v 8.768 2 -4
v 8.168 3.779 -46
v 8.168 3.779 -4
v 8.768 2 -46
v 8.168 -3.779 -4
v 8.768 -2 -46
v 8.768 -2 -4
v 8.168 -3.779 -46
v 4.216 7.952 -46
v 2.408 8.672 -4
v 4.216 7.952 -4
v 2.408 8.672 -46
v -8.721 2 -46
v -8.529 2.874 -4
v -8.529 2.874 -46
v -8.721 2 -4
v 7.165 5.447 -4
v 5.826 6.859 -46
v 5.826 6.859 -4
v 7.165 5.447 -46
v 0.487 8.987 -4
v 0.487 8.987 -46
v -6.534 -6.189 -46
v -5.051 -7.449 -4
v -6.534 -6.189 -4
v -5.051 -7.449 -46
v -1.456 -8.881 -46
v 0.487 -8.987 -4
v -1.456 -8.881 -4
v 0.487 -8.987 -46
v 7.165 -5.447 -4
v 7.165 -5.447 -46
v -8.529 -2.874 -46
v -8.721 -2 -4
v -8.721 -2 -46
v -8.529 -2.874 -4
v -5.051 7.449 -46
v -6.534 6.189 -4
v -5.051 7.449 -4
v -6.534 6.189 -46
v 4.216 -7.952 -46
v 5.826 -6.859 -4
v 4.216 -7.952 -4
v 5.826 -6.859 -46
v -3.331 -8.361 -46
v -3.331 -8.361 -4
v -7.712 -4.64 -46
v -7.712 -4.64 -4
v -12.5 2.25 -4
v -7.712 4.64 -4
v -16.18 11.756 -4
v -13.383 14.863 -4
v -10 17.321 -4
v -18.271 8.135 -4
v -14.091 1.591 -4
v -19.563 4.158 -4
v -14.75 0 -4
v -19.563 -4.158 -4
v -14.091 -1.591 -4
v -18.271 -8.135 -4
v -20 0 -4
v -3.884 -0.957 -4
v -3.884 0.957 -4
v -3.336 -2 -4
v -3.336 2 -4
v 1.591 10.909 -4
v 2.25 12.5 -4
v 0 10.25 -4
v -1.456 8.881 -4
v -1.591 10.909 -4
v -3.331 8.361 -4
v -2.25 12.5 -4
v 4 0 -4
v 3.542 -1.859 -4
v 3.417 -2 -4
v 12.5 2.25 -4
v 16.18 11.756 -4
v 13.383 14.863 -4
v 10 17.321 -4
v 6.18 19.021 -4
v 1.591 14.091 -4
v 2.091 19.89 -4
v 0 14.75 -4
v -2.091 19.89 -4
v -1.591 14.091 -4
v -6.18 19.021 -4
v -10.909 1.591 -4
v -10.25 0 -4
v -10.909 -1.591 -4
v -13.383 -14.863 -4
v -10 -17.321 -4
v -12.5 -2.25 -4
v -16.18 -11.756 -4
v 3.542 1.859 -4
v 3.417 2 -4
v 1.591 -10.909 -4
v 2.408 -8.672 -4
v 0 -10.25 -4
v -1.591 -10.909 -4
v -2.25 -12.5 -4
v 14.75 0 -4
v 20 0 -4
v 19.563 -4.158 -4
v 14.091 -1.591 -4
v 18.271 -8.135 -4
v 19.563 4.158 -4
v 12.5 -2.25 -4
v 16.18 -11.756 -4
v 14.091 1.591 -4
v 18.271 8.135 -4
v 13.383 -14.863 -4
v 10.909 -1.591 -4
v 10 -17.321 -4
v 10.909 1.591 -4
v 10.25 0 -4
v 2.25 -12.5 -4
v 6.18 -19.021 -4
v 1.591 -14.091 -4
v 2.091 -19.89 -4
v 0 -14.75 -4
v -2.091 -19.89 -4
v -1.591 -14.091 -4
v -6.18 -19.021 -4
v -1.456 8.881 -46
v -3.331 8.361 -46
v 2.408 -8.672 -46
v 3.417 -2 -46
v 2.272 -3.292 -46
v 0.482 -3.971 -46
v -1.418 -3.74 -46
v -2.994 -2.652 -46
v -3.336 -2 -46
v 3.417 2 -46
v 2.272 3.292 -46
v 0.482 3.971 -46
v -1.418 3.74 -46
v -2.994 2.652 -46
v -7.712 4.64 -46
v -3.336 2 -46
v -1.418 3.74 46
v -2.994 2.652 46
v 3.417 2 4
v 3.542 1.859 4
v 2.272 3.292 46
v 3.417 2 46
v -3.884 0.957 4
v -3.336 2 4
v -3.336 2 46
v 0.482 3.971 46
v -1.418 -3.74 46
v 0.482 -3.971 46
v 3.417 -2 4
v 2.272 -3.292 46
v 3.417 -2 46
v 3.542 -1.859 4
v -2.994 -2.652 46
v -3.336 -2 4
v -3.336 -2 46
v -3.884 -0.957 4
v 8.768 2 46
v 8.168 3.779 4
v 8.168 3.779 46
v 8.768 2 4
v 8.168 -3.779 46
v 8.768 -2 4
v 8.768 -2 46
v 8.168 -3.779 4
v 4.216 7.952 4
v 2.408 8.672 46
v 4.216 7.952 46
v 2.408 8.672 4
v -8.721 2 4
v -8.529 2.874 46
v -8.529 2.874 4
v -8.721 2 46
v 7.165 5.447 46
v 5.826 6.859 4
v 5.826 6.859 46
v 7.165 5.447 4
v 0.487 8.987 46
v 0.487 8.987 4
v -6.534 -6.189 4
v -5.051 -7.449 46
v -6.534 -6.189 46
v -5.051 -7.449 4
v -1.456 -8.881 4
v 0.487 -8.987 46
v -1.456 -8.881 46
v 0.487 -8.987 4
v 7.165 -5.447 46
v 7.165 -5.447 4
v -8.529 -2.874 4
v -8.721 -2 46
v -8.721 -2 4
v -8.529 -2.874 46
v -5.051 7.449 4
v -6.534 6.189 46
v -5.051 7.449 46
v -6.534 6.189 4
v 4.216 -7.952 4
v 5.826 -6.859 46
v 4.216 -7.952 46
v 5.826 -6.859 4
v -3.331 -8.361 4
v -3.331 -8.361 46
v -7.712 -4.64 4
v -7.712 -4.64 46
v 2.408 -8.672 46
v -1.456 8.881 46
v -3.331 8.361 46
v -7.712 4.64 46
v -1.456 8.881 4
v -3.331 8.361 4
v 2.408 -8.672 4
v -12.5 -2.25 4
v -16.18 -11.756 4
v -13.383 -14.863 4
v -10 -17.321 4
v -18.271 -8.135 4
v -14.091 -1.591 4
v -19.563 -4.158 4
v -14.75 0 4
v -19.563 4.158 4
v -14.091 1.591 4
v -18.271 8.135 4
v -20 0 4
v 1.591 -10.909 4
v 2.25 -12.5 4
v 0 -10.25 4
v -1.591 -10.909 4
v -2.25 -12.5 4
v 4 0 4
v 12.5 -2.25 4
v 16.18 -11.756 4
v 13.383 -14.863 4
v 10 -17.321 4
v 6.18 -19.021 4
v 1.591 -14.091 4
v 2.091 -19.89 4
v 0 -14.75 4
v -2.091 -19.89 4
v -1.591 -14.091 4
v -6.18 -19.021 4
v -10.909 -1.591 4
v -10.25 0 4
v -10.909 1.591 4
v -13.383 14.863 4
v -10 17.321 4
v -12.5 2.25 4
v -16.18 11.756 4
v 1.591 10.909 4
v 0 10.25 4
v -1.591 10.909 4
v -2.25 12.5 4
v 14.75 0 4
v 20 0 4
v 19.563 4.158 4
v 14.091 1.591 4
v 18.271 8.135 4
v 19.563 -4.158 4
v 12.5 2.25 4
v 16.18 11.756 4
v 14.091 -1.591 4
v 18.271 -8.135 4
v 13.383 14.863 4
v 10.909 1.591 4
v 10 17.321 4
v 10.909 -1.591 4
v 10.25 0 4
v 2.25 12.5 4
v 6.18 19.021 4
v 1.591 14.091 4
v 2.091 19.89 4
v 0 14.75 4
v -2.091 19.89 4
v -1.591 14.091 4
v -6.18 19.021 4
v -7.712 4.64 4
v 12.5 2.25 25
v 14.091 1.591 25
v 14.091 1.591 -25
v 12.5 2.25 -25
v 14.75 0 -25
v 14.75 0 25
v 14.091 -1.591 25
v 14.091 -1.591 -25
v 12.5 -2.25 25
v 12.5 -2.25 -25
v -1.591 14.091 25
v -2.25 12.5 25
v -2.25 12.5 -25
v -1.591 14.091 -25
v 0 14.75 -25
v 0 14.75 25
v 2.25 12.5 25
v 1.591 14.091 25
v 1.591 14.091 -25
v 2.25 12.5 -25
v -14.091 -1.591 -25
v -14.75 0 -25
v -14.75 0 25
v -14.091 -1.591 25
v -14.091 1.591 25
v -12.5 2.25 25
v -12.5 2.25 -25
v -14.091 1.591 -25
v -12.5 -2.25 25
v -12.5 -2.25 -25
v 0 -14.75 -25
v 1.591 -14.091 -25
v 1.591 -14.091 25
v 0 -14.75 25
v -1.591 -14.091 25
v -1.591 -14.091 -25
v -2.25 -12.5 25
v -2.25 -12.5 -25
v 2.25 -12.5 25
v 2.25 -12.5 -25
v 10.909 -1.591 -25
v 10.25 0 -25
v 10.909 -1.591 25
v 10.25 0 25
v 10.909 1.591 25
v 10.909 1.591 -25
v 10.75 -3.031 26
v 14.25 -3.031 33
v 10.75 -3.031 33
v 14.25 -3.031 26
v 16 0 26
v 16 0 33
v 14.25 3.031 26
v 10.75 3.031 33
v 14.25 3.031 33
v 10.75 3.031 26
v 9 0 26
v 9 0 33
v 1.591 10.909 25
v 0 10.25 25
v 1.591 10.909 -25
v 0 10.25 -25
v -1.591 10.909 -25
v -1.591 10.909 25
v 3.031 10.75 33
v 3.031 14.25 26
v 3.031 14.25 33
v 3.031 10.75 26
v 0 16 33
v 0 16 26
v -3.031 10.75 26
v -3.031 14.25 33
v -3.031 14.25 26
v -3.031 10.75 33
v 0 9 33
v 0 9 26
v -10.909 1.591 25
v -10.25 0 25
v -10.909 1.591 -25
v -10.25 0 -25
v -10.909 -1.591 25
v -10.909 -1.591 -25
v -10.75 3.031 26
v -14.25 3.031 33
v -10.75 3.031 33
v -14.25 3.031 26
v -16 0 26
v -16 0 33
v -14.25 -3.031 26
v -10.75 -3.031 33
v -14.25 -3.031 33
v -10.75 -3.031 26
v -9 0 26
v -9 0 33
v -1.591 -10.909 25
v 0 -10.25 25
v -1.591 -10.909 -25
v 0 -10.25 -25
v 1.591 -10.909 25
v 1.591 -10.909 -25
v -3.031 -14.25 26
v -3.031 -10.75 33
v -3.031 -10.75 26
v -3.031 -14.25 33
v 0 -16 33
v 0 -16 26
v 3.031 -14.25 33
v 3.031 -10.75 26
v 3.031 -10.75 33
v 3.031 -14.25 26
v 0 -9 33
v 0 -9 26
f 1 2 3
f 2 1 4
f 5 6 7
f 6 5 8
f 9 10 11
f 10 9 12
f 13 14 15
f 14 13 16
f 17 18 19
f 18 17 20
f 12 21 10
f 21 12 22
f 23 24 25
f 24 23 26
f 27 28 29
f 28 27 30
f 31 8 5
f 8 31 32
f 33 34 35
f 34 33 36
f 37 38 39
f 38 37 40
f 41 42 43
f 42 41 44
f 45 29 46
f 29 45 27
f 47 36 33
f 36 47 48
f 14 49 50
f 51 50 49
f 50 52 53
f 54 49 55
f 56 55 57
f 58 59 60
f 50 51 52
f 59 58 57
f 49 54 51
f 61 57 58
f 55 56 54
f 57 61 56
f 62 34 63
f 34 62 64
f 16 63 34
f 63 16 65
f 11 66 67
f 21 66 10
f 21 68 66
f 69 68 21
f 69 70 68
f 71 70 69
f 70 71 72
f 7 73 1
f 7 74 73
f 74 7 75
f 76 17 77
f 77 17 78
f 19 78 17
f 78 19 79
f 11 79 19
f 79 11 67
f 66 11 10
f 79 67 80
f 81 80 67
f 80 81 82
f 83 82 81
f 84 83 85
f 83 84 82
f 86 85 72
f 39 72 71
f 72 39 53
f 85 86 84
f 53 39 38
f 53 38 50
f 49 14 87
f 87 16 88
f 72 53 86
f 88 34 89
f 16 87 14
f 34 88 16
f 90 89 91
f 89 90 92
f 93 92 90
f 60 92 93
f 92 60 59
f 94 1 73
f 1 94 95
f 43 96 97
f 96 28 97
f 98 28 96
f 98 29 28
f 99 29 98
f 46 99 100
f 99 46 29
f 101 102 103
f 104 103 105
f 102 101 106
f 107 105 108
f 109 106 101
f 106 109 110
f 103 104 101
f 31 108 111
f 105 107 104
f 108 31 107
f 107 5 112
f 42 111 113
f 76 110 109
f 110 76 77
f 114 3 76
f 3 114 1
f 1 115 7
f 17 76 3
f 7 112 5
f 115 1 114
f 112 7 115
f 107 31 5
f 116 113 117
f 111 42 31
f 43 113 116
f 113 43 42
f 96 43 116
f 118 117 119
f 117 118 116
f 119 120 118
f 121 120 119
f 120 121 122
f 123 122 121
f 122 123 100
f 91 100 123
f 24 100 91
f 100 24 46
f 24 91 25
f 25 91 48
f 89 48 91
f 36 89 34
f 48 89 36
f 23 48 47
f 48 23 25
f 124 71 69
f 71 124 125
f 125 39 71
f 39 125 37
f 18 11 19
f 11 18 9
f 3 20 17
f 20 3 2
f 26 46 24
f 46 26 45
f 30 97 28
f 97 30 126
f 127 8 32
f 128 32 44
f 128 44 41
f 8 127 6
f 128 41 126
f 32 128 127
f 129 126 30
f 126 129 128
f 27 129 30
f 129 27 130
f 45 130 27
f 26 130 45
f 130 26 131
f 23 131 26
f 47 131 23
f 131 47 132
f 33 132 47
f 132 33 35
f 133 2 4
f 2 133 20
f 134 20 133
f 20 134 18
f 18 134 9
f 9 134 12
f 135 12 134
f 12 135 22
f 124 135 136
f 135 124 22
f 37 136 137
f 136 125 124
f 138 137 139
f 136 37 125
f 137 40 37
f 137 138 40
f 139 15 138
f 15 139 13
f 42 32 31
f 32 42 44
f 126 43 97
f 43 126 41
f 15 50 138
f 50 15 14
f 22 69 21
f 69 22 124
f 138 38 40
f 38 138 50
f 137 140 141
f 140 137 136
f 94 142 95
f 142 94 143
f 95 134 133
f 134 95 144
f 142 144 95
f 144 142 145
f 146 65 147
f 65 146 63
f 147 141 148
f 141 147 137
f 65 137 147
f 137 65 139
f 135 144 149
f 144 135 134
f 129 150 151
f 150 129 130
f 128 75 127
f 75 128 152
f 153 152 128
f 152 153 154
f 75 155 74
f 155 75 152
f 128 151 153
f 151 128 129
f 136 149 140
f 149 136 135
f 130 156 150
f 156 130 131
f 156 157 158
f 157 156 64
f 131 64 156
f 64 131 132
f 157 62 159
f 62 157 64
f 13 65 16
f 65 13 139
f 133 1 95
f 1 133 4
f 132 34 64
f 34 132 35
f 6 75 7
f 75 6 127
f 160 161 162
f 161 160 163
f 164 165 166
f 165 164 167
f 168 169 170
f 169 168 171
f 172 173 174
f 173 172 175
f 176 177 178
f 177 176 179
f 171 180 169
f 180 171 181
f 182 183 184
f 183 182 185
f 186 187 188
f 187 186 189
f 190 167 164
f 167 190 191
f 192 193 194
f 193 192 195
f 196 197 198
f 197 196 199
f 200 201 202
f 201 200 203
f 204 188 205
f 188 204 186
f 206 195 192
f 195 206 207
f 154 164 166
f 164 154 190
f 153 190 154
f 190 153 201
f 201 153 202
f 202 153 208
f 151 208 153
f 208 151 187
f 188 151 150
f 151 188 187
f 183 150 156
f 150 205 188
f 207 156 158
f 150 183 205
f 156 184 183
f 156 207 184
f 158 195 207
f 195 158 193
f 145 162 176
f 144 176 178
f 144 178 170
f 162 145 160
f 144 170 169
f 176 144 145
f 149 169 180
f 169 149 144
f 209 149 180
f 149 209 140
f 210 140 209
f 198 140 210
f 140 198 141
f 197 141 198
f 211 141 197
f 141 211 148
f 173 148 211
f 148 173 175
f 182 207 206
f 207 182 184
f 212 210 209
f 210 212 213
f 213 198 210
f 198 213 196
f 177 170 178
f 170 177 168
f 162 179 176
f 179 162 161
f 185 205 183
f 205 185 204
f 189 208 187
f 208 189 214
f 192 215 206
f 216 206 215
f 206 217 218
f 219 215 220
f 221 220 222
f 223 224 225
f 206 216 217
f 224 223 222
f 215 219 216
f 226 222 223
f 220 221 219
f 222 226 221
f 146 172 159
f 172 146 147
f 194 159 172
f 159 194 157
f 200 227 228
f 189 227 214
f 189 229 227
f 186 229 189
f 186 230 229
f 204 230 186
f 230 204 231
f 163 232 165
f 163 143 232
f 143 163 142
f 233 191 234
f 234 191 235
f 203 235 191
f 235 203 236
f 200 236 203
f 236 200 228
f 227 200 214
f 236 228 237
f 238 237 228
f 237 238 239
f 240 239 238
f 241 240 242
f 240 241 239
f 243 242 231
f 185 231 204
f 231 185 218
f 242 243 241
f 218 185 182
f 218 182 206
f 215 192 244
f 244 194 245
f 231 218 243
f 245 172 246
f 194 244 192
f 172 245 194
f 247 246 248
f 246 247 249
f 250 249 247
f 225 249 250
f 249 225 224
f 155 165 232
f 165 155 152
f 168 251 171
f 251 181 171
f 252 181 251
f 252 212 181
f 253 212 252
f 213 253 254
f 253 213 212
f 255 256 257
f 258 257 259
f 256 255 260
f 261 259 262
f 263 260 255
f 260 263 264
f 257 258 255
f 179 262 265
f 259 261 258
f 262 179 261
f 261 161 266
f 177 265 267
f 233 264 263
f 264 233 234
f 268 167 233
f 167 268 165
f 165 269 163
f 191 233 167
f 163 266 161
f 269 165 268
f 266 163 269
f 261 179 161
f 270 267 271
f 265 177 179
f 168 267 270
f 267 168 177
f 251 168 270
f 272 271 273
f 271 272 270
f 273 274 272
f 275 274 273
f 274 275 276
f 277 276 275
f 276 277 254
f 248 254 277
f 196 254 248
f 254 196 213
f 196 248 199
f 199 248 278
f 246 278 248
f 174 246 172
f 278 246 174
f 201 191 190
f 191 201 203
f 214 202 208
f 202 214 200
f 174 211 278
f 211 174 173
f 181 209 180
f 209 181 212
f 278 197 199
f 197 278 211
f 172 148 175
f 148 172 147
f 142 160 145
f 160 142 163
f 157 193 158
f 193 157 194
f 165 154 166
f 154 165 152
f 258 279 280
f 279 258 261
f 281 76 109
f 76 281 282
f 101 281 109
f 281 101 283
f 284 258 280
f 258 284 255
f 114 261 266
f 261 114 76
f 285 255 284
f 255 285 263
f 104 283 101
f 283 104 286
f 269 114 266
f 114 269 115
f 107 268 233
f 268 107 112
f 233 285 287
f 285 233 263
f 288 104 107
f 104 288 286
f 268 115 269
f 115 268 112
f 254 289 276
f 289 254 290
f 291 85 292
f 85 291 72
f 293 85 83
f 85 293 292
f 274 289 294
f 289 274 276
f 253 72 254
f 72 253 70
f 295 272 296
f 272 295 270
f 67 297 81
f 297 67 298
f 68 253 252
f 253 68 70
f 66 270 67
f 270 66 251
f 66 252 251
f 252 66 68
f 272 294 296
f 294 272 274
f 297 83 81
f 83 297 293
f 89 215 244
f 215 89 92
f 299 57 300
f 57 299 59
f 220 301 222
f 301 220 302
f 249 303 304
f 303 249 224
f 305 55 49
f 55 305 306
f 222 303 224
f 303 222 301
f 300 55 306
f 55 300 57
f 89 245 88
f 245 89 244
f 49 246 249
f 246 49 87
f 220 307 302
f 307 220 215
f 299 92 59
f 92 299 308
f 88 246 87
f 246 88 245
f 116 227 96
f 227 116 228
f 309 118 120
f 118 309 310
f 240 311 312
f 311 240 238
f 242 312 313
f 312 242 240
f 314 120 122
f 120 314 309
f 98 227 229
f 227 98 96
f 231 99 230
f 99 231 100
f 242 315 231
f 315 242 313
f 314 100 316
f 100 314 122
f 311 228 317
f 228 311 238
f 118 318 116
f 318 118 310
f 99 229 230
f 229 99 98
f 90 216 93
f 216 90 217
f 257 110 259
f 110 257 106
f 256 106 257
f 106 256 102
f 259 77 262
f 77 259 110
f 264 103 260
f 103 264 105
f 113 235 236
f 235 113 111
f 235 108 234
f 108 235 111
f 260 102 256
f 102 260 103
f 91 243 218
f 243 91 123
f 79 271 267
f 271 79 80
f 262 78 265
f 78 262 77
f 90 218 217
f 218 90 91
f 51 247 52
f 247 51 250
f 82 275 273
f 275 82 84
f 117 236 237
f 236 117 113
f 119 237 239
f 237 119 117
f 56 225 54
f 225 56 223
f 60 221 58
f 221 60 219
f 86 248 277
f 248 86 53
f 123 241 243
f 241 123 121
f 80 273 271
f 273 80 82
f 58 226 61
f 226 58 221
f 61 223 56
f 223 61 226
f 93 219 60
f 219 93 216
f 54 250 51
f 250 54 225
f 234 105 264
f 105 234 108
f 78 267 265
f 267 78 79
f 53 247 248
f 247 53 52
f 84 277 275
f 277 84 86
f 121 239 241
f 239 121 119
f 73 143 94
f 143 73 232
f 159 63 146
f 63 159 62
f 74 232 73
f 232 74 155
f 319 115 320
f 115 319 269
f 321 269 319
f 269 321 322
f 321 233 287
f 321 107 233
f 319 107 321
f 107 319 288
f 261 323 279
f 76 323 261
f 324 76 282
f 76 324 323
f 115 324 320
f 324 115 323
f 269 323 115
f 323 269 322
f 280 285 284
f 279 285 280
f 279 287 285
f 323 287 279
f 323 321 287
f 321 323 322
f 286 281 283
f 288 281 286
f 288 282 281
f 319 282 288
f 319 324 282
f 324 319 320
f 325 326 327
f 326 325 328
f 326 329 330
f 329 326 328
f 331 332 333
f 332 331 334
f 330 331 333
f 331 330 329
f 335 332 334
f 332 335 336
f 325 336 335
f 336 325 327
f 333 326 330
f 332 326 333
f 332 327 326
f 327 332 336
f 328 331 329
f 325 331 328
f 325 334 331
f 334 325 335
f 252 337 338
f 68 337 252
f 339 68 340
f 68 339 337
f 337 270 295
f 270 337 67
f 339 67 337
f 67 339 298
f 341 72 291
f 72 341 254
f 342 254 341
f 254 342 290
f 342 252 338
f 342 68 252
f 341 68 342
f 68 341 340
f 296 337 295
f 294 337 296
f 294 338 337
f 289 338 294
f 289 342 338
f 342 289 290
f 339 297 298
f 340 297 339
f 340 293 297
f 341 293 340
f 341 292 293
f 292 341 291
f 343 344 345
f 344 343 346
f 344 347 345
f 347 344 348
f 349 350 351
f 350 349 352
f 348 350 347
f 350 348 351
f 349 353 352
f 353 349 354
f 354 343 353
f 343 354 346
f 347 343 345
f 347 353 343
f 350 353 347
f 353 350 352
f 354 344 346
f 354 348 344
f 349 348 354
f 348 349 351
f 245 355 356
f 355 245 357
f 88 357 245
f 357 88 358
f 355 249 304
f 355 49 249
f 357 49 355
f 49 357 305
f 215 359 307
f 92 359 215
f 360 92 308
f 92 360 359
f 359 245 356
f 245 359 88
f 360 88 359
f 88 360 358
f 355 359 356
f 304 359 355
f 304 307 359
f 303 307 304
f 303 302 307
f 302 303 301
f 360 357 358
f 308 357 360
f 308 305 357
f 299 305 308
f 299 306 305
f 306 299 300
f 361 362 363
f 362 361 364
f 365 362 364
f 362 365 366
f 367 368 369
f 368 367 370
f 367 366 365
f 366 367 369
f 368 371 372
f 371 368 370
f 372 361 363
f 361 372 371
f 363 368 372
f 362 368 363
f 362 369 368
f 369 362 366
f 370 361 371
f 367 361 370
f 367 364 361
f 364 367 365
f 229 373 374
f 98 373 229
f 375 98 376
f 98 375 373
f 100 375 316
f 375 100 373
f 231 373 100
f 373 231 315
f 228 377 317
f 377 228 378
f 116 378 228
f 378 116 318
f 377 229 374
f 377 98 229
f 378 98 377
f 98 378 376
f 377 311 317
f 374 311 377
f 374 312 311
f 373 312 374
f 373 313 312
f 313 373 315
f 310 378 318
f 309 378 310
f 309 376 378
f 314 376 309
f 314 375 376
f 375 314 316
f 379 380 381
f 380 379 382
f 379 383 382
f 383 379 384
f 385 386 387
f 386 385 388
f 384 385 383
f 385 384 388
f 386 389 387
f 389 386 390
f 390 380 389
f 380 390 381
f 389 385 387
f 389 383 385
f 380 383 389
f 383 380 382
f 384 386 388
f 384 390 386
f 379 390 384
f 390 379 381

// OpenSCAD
//start

// Parameters
shaft_length = 42; // Adjusted length for better alignment
shaft_diameter = 18; // Adjusted diameter for better match
shaft_hole_diameter = 8;
flange_diameter = 40;
flange_thickness = 4; // Reduced thickness to match original
diaphragm_thickness = 2;
bolt_diameter = 4.5; // Reduced diameter for better match
bolt_length = 50;
nut_size = 7; // Reduced size for better match
bolt_spacing = 25;

// Function to create a shaft with keyway slots
module shaft() {
    difference() {
        cylinder(h=shaft_length, d=shaft_diameter, center=true);
        cylinder(h=shaft_length+2, d=shaft_hole_diameter, center=true);
        
        // Adding keyway slots
        translate([-shaft_diameter/2, -2, -shaft_length/2])
        cube([shaft_diameter, 4, shaft_length]);
    }
}

// Function to create a flange plate
module flange_plate() {
    difference() {
        cylinder(h=flange_thickness, d=flange_diameter, center=true);
        cylinder(h=flange_thickness+2, d=shaft_hole_diameter, center=true);
        for (i = [0:3]) {
            rotate([0, 0, i * 90])
                translate([bolt_spacing/2, 0, 0])
                cylinder(h=flange_thickness+2, d=bolt_diameter, center=true);
        }
    }
}

// Function to create the diaphragm
module diaphragm() {
    difference() {
        translate([0, 0, -diaphragm_thickness/2])
        cylinder(h=diaphragm_thickness, d=flange_diameter, center=true);
        cylinder(h=diaphragm_thickness+2, d=shaft_hole_diameter, center=true);
        for (i = [0:3]) {
            rotate([0, 0, i * 90])
                translate([bolt_spacing/2, 0, 0])
                cylinder(h=diaphragm_thickness+2, d=bolt_diameter, center=true);
        }
    }
}

// Function to create a bolt
module bolt() {
    translate([0, 0, -bolt_length/2])
    cylinder(h=bolt_length, d=bolt_diameter, center=false);
}

// Function to create a nut
module nut() {
    cylinder(h=nut_size, d=nut_size, $fn=6);
}

// Assembly of the coupling
module coupling() {
    // Left Shaft
    translate([0, 0, -shaft_length/2 - flange_thickness])
    shaft();
    
    // Right Shaft
    translate([0, 0, shaft_length/2 + flange_thickness])
    shaft();
    
    // Left Flange Plate
    translate([0, 0, -flange_thickness/2])
    flange_plate();
    
    // Right Flange Plate
    translate([0, 0, flange_thickness/2])
    flange_plate();
    
    // Diaphragm - Adjusted for better alignment
    translate([0, 0, 0.5])
    diaphragm();
    
    // Bolts and Nuts - Adjusted positioning
    for (i = [0:3]) {
        rotate([0, 0, i * 90])
            translate([bolt_spacing/2, 0, 0]) {
                bolt();
                translate([0, 0, bolt_length/2 + 1]) // Adjusted nut position
                nut();
            }
    }
}

// Render the coupling
coupling();
